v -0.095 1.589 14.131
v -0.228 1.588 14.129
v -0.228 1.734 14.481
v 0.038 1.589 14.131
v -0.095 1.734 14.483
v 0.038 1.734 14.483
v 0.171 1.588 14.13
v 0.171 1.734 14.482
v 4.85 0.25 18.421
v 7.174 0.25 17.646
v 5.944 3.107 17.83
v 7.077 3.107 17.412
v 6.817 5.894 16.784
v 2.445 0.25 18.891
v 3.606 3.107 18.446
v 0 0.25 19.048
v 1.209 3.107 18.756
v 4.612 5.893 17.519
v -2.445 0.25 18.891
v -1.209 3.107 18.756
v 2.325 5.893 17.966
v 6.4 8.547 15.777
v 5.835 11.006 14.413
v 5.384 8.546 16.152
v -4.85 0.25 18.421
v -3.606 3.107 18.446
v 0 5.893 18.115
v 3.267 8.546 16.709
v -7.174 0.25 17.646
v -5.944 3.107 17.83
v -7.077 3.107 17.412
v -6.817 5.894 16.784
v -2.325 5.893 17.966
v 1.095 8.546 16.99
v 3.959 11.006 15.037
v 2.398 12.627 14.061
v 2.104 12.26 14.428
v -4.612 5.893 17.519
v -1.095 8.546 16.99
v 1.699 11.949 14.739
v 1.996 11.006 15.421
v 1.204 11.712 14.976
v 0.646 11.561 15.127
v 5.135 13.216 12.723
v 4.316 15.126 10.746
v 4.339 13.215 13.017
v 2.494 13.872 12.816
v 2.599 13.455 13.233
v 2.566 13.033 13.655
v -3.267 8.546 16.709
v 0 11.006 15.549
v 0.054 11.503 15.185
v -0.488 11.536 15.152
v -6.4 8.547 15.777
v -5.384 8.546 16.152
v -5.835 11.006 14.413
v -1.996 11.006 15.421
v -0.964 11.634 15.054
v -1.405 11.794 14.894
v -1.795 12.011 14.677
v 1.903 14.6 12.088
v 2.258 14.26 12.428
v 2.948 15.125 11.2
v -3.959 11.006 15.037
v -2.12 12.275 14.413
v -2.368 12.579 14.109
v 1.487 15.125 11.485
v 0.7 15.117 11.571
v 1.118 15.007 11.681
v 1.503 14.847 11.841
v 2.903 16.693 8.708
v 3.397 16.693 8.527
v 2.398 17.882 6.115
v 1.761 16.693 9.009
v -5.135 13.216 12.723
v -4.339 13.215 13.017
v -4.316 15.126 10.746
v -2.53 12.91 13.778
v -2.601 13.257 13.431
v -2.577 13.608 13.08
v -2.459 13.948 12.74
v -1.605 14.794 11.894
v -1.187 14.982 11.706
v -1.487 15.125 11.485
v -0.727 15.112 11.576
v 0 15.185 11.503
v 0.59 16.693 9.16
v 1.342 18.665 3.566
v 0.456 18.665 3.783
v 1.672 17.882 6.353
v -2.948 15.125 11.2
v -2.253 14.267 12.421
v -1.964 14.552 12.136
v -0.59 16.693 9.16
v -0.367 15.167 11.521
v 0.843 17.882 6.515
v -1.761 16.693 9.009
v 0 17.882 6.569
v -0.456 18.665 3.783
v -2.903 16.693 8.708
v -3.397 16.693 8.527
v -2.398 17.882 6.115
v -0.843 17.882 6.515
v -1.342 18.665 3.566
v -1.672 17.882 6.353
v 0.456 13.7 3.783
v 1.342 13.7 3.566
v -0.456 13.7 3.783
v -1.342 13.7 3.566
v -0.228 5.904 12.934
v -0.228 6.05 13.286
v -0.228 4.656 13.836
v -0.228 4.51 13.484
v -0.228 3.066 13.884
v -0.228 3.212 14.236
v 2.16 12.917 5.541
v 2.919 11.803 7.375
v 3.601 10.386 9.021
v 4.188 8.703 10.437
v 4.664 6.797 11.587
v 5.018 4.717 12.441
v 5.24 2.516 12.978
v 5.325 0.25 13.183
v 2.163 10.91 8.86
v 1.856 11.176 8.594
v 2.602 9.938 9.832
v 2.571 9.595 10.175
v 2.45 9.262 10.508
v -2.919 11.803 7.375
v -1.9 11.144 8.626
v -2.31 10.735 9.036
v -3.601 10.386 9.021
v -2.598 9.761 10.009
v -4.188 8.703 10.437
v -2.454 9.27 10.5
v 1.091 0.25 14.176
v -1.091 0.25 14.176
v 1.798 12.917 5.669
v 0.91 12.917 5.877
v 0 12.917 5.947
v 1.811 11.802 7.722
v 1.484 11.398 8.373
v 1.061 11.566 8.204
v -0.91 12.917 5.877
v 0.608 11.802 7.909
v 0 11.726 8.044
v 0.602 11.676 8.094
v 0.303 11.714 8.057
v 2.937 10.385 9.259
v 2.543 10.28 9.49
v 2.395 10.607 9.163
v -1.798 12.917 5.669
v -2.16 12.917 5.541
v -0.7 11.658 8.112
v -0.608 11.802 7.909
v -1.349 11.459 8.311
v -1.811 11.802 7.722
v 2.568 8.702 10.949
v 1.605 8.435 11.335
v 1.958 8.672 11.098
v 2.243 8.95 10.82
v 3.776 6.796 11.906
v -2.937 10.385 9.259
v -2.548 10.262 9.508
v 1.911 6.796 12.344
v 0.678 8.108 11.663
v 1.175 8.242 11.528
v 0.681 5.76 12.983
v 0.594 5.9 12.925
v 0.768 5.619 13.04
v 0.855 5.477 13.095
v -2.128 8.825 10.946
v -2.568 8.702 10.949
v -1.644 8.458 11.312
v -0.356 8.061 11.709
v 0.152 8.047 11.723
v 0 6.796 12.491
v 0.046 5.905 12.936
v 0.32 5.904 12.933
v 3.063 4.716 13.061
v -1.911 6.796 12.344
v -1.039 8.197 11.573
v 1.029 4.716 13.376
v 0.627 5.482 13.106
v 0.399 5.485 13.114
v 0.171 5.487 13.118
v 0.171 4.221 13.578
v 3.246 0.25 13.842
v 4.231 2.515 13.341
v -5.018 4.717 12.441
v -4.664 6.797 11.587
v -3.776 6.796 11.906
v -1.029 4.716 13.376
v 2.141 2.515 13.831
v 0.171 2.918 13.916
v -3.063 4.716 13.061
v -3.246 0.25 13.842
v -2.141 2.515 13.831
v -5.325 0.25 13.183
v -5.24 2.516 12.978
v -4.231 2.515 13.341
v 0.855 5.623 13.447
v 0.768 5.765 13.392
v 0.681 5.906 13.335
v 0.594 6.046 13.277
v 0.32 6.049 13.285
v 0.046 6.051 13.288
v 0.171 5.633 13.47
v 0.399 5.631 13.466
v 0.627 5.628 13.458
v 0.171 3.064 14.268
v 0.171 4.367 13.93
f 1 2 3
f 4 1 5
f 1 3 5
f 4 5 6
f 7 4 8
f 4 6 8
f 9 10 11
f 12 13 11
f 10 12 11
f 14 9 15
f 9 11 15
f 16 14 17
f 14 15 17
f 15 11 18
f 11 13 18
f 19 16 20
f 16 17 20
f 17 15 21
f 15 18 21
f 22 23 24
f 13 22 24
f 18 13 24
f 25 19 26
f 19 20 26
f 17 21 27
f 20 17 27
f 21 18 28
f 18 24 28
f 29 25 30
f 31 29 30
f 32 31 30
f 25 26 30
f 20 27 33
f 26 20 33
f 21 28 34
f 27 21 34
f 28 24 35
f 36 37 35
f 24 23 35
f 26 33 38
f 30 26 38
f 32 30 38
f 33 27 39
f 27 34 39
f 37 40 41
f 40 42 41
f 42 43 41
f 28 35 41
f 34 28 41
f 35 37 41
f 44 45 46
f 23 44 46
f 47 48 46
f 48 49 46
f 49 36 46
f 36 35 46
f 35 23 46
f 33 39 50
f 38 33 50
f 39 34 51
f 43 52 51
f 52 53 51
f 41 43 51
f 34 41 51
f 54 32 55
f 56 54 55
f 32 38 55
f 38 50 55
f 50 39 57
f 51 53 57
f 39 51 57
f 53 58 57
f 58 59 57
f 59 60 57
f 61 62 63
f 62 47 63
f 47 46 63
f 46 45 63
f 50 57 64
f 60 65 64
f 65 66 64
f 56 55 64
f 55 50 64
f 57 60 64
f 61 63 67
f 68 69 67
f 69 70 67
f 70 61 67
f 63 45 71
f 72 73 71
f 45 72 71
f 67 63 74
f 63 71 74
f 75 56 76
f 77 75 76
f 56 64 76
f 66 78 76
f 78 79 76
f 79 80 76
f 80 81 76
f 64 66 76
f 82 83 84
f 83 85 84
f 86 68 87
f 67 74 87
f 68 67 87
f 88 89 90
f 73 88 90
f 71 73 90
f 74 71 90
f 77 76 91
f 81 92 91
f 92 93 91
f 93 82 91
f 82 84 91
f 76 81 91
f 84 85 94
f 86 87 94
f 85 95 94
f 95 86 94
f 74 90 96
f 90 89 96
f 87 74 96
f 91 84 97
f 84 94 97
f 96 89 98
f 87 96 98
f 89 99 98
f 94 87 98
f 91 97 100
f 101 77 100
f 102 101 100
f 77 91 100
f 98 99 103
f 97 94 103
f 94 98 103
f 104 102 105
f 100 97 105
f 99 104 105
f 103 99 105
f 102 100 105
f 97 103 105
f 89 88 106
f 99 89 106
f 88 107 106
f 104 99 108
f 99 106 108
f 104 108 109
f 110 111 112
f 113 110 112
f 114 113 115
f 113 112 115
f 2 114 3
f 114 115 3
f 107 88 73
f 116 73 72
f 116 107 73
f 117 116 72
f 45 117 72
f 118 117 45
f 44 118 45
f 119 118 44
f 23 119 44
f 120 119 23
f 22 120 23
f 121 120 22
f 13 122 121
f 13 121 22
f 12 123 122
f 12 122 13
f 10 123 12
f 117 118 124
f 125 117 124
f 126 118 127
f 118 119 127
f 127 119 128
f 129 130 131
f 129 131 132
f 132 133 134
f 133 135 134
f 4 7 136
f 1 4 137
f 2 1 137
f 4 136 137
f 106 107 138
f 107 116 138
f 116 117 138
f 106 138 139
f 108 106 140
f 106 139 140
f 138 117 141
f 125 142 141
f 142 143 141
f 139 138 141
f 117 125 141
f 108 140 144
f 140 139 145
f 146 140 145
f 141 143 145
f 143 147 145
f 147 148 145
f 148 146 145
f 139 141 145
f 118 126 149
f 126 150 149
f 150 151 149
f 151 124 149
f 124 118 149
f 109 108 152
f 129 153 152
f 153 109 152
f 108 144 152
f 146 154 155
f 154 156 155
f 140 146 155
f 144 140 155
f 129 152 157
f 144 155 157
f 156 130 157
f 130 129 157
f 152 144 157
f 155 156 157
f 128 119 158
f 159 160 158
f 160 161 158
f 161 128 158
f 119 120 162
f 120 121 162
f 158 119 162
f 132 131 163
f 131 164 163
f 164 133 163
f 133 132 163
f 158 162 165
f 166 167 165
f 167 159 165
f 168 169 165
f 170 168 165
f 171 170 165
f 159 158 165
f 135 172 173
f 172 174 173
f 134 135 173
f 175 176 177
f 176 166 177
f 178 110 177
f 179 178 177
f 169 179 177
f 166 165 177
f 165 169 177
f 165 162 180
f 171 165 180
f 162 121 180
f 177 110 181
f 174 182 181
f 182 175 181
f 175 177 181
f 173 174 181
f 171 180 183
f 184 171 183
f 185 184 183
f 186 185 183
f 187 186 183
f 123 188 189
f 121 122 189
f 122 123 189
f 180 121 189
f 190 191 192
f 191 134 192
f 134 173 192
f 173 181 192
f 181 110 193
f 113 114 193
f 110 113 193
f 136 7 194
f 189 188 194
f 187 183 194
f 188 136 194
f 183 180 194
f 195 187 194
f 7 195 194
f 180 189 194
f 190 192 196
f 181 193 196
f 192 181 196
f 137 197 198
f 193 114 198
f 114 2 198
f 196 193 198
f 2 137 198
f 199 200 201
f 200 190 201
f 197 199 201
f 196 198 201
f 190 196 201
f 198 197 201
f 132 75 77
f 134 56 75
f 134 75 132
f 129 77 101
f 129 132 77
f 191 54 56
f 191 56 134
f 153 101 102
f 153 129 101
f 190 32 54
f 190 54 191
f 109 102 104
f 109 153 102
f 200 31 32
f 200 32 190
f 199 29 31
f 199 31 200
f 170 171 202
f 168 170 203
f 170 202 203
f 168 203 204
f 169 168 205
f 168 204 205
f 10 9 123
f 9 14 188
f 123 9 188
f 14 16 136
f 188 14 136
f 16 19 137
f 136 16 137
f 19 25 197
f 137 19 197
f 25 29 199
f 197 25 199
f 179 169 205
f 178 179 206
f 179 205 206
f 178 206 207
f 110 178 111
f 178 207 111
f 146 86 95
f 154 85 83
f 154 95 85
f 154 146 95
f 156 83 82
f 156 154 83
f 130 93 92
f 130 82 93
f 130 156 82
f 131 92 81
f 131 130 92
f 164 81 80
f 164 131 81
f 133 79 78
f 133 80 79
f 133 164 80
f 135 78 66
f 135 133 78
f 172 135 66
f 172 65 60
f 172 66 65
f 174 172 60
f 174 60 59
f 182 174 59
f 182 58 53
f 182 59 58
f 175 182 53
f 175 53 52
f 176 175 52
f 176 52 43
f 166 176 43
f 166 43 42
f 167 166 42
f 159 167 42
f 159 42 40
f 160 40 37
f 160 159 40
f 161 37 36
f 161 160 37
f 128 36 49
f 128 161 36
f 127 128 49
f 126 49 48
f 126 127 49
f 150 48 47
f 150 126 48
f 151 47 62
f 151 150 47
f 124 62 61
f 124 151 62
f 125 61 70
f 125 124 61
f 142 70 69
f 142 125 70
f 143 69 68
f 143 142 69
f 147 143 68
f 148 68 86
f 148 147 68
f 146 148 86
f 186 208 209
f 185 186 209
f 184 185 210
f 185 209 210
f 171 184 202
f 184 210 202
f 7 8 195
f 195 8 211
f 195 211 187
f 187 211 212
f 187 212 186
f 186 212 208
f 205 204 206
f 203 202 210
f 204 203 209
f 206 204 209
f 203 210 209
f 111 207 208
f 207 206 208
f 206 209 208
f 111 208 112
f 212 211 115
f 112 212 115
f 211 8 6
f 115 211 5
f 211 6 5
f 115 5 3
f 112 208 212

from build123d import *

# Parameters (mm, degrees)
REVOLVE1_ANGLE            = 45
CUT_EXTRUDE1_DEPTH        = 28.647117169
CUT_EXTRUDE1_DEPTH_BACK   = 28.647117169
CUT_EXTRUDE4_REACH        = 29.998
CUT_EXTRUDE4_START_RADIUS = 14.22
CUT_EXTRUDE4_END_RADIUS   = 14.22
CUT_EXTRUDE5_DEPTH        = 26.131771039
CUT_EXTRUDE5_DEPTH_BACK   = 26.131771039
SKETCH9_R                 = 2.6035


with BuildPart() as part:
    # Sketch1 → Revolve1 (revolve, symmetric)
    with BuildSketch(Plane(origin=(0, 0, 0), x_dir=(0, 0, -1), z_dir=(1, 0, 0))) as revolve1_sk:
        with BuildLine():
            Line((-14.217802221, 0.25), (-19.048359509, 0.25))
            ThreePointArc((-19.048359509, 0.25), (-14.676690222, 12.144845166), (-3.81, 18.66511184))
            Line((-3.81, 18.66511184), (-3.81, 13.700083941))
            ThreePointArc((-3.81, 13.700083941), (-11.246181696, 8.70240181), (-14.217802221, 0.25))
        make_face()
    revolve(axis=Axis((0, 0, 0), (0, 1, 0)), revolution_arc=REVOLVE1_ANGLE / 2)
    revolve(revolve1_sk.sketch, axis=Axis((0, 0, 0), (0, -1, 0)), revolution_arc=REVOLVE1_ANGLE / 2)

    # Sketch2 → Cut-Extrude1 (cut, two sides: drawn at the far end of the back side and taken through both)
    with BuildSketch(Plane(origin=(0, 0, 0), x_dir=(1, 0, 0), z_dir=(0, 1, 0)).offset(-CUT_EXTRUDE1_DEPTH_BACK)):
        with BuildLine():
            Line((7.289491598, -17.598389479), (1.458023877, -3.519981019))
            ThreePointArc((1.458023877, -3.519981019), (1.400077392, -3.543428184), (1.341754023, -3.5659215))
            Line((1.341754023, -3.5659215), (7.173849701, -17.645845983))
            ThreePointArc((7.173849701, -17.645845983), (7.231709577, -17.622212591), (7.289491598, -17.598389479))
        make_face()
        with BuildLine():
            Line((-7.173849701, -17.645845983), (-1.341754023, -3.5659215))
            ThreePointArc((-1.341754023, -3.5659215), (-1.400077392, -3.543428184), (-1.458023877, -3.519981019))
            Line((-1.458023877, -3.519981019), (-7.289491598, -17.598389479))
            ThreePointArc((-7.289491598, -17.598389479), (-7.231709577, -17.622212591), (-7.173849701, -17.645845983))
        make_face()
    extrude(amount=CUT_EXTRUDE1_DEPTH + CUT_EXTRUDE1_DEPTH_BACK, mode=Mode.SUBTRACT)

    # Cut-Extrude4: from a sphere face, 29.998 long prism both ways, kept between that surface and its translate by the depth
    cut_extrude4_start = Location((0, 0, 0)) * Sphere(CUT_EXTRUDE4_START_RADIUS, mode=Mode.PRIVATE)
    cut_extrude4_end = Location((0, 0.145802388, 0.351998102)) * Sphere(CUT_EXTRUDE4_END_RADIUS, mode=Mode.PRIVATE)
    # Sketch8 → Cut-Extrude4 (cut, from a surface)
    with BuildSketch(Plane(origin=(0, 0, 0), x_dir=(-1, 0, 0), z_dir=(0, 0.3826834323650899, 0.9238795325112868)), mode=Mode.PRIVATE) as cut_extrude4_sk1:
        Polygon((-0.593913261, -0.505052528), (0.227948718, -0.505052528), (0.227948718, 3.939947472), (-0.170961538, 3.939947472), (-0.170961538, -0.049155093), (-0.854807692, -0.049155093), align=None)
    cut_extrude4_tool1 = extrude(cut_extrude4_sk1.sketch, amount=CUT_EXTRUDE4_REACH, both=True, mode=Mode.PRIVATE)
    add(((cut_extrude4_tool1 - cut_extrude4_start) & cut_extrude4_end).solids().sort_by_distance((0.031455, 4.048316, 13.618019))[0], mode=Mode.SUBTRACT)

    # Sketch9 → Cut-Extrude5 (cut, two sides: drawn at the far end of the back side and taken through both)
    with BuildSketch(Plane(origin=(0, 18.858537854, 18.858537854), x_dir=(1, 0, 0), z_dir=(0, 0.7071067811865478, 0.7071067811865474)).offset(-CUT_EXTRUDE5_DEPTH_BACK)):
        with Locations(Location((0, 0, 0), (0, 0, 90))):
            Circle(SKETCH9_R)
    extrude(amount=CUT_EXTRUDE5_DEPTH + CUT_EXTRUDE5_DEPTH_BACK, mode=Mode.SUBTRACT)


solid = part.part
